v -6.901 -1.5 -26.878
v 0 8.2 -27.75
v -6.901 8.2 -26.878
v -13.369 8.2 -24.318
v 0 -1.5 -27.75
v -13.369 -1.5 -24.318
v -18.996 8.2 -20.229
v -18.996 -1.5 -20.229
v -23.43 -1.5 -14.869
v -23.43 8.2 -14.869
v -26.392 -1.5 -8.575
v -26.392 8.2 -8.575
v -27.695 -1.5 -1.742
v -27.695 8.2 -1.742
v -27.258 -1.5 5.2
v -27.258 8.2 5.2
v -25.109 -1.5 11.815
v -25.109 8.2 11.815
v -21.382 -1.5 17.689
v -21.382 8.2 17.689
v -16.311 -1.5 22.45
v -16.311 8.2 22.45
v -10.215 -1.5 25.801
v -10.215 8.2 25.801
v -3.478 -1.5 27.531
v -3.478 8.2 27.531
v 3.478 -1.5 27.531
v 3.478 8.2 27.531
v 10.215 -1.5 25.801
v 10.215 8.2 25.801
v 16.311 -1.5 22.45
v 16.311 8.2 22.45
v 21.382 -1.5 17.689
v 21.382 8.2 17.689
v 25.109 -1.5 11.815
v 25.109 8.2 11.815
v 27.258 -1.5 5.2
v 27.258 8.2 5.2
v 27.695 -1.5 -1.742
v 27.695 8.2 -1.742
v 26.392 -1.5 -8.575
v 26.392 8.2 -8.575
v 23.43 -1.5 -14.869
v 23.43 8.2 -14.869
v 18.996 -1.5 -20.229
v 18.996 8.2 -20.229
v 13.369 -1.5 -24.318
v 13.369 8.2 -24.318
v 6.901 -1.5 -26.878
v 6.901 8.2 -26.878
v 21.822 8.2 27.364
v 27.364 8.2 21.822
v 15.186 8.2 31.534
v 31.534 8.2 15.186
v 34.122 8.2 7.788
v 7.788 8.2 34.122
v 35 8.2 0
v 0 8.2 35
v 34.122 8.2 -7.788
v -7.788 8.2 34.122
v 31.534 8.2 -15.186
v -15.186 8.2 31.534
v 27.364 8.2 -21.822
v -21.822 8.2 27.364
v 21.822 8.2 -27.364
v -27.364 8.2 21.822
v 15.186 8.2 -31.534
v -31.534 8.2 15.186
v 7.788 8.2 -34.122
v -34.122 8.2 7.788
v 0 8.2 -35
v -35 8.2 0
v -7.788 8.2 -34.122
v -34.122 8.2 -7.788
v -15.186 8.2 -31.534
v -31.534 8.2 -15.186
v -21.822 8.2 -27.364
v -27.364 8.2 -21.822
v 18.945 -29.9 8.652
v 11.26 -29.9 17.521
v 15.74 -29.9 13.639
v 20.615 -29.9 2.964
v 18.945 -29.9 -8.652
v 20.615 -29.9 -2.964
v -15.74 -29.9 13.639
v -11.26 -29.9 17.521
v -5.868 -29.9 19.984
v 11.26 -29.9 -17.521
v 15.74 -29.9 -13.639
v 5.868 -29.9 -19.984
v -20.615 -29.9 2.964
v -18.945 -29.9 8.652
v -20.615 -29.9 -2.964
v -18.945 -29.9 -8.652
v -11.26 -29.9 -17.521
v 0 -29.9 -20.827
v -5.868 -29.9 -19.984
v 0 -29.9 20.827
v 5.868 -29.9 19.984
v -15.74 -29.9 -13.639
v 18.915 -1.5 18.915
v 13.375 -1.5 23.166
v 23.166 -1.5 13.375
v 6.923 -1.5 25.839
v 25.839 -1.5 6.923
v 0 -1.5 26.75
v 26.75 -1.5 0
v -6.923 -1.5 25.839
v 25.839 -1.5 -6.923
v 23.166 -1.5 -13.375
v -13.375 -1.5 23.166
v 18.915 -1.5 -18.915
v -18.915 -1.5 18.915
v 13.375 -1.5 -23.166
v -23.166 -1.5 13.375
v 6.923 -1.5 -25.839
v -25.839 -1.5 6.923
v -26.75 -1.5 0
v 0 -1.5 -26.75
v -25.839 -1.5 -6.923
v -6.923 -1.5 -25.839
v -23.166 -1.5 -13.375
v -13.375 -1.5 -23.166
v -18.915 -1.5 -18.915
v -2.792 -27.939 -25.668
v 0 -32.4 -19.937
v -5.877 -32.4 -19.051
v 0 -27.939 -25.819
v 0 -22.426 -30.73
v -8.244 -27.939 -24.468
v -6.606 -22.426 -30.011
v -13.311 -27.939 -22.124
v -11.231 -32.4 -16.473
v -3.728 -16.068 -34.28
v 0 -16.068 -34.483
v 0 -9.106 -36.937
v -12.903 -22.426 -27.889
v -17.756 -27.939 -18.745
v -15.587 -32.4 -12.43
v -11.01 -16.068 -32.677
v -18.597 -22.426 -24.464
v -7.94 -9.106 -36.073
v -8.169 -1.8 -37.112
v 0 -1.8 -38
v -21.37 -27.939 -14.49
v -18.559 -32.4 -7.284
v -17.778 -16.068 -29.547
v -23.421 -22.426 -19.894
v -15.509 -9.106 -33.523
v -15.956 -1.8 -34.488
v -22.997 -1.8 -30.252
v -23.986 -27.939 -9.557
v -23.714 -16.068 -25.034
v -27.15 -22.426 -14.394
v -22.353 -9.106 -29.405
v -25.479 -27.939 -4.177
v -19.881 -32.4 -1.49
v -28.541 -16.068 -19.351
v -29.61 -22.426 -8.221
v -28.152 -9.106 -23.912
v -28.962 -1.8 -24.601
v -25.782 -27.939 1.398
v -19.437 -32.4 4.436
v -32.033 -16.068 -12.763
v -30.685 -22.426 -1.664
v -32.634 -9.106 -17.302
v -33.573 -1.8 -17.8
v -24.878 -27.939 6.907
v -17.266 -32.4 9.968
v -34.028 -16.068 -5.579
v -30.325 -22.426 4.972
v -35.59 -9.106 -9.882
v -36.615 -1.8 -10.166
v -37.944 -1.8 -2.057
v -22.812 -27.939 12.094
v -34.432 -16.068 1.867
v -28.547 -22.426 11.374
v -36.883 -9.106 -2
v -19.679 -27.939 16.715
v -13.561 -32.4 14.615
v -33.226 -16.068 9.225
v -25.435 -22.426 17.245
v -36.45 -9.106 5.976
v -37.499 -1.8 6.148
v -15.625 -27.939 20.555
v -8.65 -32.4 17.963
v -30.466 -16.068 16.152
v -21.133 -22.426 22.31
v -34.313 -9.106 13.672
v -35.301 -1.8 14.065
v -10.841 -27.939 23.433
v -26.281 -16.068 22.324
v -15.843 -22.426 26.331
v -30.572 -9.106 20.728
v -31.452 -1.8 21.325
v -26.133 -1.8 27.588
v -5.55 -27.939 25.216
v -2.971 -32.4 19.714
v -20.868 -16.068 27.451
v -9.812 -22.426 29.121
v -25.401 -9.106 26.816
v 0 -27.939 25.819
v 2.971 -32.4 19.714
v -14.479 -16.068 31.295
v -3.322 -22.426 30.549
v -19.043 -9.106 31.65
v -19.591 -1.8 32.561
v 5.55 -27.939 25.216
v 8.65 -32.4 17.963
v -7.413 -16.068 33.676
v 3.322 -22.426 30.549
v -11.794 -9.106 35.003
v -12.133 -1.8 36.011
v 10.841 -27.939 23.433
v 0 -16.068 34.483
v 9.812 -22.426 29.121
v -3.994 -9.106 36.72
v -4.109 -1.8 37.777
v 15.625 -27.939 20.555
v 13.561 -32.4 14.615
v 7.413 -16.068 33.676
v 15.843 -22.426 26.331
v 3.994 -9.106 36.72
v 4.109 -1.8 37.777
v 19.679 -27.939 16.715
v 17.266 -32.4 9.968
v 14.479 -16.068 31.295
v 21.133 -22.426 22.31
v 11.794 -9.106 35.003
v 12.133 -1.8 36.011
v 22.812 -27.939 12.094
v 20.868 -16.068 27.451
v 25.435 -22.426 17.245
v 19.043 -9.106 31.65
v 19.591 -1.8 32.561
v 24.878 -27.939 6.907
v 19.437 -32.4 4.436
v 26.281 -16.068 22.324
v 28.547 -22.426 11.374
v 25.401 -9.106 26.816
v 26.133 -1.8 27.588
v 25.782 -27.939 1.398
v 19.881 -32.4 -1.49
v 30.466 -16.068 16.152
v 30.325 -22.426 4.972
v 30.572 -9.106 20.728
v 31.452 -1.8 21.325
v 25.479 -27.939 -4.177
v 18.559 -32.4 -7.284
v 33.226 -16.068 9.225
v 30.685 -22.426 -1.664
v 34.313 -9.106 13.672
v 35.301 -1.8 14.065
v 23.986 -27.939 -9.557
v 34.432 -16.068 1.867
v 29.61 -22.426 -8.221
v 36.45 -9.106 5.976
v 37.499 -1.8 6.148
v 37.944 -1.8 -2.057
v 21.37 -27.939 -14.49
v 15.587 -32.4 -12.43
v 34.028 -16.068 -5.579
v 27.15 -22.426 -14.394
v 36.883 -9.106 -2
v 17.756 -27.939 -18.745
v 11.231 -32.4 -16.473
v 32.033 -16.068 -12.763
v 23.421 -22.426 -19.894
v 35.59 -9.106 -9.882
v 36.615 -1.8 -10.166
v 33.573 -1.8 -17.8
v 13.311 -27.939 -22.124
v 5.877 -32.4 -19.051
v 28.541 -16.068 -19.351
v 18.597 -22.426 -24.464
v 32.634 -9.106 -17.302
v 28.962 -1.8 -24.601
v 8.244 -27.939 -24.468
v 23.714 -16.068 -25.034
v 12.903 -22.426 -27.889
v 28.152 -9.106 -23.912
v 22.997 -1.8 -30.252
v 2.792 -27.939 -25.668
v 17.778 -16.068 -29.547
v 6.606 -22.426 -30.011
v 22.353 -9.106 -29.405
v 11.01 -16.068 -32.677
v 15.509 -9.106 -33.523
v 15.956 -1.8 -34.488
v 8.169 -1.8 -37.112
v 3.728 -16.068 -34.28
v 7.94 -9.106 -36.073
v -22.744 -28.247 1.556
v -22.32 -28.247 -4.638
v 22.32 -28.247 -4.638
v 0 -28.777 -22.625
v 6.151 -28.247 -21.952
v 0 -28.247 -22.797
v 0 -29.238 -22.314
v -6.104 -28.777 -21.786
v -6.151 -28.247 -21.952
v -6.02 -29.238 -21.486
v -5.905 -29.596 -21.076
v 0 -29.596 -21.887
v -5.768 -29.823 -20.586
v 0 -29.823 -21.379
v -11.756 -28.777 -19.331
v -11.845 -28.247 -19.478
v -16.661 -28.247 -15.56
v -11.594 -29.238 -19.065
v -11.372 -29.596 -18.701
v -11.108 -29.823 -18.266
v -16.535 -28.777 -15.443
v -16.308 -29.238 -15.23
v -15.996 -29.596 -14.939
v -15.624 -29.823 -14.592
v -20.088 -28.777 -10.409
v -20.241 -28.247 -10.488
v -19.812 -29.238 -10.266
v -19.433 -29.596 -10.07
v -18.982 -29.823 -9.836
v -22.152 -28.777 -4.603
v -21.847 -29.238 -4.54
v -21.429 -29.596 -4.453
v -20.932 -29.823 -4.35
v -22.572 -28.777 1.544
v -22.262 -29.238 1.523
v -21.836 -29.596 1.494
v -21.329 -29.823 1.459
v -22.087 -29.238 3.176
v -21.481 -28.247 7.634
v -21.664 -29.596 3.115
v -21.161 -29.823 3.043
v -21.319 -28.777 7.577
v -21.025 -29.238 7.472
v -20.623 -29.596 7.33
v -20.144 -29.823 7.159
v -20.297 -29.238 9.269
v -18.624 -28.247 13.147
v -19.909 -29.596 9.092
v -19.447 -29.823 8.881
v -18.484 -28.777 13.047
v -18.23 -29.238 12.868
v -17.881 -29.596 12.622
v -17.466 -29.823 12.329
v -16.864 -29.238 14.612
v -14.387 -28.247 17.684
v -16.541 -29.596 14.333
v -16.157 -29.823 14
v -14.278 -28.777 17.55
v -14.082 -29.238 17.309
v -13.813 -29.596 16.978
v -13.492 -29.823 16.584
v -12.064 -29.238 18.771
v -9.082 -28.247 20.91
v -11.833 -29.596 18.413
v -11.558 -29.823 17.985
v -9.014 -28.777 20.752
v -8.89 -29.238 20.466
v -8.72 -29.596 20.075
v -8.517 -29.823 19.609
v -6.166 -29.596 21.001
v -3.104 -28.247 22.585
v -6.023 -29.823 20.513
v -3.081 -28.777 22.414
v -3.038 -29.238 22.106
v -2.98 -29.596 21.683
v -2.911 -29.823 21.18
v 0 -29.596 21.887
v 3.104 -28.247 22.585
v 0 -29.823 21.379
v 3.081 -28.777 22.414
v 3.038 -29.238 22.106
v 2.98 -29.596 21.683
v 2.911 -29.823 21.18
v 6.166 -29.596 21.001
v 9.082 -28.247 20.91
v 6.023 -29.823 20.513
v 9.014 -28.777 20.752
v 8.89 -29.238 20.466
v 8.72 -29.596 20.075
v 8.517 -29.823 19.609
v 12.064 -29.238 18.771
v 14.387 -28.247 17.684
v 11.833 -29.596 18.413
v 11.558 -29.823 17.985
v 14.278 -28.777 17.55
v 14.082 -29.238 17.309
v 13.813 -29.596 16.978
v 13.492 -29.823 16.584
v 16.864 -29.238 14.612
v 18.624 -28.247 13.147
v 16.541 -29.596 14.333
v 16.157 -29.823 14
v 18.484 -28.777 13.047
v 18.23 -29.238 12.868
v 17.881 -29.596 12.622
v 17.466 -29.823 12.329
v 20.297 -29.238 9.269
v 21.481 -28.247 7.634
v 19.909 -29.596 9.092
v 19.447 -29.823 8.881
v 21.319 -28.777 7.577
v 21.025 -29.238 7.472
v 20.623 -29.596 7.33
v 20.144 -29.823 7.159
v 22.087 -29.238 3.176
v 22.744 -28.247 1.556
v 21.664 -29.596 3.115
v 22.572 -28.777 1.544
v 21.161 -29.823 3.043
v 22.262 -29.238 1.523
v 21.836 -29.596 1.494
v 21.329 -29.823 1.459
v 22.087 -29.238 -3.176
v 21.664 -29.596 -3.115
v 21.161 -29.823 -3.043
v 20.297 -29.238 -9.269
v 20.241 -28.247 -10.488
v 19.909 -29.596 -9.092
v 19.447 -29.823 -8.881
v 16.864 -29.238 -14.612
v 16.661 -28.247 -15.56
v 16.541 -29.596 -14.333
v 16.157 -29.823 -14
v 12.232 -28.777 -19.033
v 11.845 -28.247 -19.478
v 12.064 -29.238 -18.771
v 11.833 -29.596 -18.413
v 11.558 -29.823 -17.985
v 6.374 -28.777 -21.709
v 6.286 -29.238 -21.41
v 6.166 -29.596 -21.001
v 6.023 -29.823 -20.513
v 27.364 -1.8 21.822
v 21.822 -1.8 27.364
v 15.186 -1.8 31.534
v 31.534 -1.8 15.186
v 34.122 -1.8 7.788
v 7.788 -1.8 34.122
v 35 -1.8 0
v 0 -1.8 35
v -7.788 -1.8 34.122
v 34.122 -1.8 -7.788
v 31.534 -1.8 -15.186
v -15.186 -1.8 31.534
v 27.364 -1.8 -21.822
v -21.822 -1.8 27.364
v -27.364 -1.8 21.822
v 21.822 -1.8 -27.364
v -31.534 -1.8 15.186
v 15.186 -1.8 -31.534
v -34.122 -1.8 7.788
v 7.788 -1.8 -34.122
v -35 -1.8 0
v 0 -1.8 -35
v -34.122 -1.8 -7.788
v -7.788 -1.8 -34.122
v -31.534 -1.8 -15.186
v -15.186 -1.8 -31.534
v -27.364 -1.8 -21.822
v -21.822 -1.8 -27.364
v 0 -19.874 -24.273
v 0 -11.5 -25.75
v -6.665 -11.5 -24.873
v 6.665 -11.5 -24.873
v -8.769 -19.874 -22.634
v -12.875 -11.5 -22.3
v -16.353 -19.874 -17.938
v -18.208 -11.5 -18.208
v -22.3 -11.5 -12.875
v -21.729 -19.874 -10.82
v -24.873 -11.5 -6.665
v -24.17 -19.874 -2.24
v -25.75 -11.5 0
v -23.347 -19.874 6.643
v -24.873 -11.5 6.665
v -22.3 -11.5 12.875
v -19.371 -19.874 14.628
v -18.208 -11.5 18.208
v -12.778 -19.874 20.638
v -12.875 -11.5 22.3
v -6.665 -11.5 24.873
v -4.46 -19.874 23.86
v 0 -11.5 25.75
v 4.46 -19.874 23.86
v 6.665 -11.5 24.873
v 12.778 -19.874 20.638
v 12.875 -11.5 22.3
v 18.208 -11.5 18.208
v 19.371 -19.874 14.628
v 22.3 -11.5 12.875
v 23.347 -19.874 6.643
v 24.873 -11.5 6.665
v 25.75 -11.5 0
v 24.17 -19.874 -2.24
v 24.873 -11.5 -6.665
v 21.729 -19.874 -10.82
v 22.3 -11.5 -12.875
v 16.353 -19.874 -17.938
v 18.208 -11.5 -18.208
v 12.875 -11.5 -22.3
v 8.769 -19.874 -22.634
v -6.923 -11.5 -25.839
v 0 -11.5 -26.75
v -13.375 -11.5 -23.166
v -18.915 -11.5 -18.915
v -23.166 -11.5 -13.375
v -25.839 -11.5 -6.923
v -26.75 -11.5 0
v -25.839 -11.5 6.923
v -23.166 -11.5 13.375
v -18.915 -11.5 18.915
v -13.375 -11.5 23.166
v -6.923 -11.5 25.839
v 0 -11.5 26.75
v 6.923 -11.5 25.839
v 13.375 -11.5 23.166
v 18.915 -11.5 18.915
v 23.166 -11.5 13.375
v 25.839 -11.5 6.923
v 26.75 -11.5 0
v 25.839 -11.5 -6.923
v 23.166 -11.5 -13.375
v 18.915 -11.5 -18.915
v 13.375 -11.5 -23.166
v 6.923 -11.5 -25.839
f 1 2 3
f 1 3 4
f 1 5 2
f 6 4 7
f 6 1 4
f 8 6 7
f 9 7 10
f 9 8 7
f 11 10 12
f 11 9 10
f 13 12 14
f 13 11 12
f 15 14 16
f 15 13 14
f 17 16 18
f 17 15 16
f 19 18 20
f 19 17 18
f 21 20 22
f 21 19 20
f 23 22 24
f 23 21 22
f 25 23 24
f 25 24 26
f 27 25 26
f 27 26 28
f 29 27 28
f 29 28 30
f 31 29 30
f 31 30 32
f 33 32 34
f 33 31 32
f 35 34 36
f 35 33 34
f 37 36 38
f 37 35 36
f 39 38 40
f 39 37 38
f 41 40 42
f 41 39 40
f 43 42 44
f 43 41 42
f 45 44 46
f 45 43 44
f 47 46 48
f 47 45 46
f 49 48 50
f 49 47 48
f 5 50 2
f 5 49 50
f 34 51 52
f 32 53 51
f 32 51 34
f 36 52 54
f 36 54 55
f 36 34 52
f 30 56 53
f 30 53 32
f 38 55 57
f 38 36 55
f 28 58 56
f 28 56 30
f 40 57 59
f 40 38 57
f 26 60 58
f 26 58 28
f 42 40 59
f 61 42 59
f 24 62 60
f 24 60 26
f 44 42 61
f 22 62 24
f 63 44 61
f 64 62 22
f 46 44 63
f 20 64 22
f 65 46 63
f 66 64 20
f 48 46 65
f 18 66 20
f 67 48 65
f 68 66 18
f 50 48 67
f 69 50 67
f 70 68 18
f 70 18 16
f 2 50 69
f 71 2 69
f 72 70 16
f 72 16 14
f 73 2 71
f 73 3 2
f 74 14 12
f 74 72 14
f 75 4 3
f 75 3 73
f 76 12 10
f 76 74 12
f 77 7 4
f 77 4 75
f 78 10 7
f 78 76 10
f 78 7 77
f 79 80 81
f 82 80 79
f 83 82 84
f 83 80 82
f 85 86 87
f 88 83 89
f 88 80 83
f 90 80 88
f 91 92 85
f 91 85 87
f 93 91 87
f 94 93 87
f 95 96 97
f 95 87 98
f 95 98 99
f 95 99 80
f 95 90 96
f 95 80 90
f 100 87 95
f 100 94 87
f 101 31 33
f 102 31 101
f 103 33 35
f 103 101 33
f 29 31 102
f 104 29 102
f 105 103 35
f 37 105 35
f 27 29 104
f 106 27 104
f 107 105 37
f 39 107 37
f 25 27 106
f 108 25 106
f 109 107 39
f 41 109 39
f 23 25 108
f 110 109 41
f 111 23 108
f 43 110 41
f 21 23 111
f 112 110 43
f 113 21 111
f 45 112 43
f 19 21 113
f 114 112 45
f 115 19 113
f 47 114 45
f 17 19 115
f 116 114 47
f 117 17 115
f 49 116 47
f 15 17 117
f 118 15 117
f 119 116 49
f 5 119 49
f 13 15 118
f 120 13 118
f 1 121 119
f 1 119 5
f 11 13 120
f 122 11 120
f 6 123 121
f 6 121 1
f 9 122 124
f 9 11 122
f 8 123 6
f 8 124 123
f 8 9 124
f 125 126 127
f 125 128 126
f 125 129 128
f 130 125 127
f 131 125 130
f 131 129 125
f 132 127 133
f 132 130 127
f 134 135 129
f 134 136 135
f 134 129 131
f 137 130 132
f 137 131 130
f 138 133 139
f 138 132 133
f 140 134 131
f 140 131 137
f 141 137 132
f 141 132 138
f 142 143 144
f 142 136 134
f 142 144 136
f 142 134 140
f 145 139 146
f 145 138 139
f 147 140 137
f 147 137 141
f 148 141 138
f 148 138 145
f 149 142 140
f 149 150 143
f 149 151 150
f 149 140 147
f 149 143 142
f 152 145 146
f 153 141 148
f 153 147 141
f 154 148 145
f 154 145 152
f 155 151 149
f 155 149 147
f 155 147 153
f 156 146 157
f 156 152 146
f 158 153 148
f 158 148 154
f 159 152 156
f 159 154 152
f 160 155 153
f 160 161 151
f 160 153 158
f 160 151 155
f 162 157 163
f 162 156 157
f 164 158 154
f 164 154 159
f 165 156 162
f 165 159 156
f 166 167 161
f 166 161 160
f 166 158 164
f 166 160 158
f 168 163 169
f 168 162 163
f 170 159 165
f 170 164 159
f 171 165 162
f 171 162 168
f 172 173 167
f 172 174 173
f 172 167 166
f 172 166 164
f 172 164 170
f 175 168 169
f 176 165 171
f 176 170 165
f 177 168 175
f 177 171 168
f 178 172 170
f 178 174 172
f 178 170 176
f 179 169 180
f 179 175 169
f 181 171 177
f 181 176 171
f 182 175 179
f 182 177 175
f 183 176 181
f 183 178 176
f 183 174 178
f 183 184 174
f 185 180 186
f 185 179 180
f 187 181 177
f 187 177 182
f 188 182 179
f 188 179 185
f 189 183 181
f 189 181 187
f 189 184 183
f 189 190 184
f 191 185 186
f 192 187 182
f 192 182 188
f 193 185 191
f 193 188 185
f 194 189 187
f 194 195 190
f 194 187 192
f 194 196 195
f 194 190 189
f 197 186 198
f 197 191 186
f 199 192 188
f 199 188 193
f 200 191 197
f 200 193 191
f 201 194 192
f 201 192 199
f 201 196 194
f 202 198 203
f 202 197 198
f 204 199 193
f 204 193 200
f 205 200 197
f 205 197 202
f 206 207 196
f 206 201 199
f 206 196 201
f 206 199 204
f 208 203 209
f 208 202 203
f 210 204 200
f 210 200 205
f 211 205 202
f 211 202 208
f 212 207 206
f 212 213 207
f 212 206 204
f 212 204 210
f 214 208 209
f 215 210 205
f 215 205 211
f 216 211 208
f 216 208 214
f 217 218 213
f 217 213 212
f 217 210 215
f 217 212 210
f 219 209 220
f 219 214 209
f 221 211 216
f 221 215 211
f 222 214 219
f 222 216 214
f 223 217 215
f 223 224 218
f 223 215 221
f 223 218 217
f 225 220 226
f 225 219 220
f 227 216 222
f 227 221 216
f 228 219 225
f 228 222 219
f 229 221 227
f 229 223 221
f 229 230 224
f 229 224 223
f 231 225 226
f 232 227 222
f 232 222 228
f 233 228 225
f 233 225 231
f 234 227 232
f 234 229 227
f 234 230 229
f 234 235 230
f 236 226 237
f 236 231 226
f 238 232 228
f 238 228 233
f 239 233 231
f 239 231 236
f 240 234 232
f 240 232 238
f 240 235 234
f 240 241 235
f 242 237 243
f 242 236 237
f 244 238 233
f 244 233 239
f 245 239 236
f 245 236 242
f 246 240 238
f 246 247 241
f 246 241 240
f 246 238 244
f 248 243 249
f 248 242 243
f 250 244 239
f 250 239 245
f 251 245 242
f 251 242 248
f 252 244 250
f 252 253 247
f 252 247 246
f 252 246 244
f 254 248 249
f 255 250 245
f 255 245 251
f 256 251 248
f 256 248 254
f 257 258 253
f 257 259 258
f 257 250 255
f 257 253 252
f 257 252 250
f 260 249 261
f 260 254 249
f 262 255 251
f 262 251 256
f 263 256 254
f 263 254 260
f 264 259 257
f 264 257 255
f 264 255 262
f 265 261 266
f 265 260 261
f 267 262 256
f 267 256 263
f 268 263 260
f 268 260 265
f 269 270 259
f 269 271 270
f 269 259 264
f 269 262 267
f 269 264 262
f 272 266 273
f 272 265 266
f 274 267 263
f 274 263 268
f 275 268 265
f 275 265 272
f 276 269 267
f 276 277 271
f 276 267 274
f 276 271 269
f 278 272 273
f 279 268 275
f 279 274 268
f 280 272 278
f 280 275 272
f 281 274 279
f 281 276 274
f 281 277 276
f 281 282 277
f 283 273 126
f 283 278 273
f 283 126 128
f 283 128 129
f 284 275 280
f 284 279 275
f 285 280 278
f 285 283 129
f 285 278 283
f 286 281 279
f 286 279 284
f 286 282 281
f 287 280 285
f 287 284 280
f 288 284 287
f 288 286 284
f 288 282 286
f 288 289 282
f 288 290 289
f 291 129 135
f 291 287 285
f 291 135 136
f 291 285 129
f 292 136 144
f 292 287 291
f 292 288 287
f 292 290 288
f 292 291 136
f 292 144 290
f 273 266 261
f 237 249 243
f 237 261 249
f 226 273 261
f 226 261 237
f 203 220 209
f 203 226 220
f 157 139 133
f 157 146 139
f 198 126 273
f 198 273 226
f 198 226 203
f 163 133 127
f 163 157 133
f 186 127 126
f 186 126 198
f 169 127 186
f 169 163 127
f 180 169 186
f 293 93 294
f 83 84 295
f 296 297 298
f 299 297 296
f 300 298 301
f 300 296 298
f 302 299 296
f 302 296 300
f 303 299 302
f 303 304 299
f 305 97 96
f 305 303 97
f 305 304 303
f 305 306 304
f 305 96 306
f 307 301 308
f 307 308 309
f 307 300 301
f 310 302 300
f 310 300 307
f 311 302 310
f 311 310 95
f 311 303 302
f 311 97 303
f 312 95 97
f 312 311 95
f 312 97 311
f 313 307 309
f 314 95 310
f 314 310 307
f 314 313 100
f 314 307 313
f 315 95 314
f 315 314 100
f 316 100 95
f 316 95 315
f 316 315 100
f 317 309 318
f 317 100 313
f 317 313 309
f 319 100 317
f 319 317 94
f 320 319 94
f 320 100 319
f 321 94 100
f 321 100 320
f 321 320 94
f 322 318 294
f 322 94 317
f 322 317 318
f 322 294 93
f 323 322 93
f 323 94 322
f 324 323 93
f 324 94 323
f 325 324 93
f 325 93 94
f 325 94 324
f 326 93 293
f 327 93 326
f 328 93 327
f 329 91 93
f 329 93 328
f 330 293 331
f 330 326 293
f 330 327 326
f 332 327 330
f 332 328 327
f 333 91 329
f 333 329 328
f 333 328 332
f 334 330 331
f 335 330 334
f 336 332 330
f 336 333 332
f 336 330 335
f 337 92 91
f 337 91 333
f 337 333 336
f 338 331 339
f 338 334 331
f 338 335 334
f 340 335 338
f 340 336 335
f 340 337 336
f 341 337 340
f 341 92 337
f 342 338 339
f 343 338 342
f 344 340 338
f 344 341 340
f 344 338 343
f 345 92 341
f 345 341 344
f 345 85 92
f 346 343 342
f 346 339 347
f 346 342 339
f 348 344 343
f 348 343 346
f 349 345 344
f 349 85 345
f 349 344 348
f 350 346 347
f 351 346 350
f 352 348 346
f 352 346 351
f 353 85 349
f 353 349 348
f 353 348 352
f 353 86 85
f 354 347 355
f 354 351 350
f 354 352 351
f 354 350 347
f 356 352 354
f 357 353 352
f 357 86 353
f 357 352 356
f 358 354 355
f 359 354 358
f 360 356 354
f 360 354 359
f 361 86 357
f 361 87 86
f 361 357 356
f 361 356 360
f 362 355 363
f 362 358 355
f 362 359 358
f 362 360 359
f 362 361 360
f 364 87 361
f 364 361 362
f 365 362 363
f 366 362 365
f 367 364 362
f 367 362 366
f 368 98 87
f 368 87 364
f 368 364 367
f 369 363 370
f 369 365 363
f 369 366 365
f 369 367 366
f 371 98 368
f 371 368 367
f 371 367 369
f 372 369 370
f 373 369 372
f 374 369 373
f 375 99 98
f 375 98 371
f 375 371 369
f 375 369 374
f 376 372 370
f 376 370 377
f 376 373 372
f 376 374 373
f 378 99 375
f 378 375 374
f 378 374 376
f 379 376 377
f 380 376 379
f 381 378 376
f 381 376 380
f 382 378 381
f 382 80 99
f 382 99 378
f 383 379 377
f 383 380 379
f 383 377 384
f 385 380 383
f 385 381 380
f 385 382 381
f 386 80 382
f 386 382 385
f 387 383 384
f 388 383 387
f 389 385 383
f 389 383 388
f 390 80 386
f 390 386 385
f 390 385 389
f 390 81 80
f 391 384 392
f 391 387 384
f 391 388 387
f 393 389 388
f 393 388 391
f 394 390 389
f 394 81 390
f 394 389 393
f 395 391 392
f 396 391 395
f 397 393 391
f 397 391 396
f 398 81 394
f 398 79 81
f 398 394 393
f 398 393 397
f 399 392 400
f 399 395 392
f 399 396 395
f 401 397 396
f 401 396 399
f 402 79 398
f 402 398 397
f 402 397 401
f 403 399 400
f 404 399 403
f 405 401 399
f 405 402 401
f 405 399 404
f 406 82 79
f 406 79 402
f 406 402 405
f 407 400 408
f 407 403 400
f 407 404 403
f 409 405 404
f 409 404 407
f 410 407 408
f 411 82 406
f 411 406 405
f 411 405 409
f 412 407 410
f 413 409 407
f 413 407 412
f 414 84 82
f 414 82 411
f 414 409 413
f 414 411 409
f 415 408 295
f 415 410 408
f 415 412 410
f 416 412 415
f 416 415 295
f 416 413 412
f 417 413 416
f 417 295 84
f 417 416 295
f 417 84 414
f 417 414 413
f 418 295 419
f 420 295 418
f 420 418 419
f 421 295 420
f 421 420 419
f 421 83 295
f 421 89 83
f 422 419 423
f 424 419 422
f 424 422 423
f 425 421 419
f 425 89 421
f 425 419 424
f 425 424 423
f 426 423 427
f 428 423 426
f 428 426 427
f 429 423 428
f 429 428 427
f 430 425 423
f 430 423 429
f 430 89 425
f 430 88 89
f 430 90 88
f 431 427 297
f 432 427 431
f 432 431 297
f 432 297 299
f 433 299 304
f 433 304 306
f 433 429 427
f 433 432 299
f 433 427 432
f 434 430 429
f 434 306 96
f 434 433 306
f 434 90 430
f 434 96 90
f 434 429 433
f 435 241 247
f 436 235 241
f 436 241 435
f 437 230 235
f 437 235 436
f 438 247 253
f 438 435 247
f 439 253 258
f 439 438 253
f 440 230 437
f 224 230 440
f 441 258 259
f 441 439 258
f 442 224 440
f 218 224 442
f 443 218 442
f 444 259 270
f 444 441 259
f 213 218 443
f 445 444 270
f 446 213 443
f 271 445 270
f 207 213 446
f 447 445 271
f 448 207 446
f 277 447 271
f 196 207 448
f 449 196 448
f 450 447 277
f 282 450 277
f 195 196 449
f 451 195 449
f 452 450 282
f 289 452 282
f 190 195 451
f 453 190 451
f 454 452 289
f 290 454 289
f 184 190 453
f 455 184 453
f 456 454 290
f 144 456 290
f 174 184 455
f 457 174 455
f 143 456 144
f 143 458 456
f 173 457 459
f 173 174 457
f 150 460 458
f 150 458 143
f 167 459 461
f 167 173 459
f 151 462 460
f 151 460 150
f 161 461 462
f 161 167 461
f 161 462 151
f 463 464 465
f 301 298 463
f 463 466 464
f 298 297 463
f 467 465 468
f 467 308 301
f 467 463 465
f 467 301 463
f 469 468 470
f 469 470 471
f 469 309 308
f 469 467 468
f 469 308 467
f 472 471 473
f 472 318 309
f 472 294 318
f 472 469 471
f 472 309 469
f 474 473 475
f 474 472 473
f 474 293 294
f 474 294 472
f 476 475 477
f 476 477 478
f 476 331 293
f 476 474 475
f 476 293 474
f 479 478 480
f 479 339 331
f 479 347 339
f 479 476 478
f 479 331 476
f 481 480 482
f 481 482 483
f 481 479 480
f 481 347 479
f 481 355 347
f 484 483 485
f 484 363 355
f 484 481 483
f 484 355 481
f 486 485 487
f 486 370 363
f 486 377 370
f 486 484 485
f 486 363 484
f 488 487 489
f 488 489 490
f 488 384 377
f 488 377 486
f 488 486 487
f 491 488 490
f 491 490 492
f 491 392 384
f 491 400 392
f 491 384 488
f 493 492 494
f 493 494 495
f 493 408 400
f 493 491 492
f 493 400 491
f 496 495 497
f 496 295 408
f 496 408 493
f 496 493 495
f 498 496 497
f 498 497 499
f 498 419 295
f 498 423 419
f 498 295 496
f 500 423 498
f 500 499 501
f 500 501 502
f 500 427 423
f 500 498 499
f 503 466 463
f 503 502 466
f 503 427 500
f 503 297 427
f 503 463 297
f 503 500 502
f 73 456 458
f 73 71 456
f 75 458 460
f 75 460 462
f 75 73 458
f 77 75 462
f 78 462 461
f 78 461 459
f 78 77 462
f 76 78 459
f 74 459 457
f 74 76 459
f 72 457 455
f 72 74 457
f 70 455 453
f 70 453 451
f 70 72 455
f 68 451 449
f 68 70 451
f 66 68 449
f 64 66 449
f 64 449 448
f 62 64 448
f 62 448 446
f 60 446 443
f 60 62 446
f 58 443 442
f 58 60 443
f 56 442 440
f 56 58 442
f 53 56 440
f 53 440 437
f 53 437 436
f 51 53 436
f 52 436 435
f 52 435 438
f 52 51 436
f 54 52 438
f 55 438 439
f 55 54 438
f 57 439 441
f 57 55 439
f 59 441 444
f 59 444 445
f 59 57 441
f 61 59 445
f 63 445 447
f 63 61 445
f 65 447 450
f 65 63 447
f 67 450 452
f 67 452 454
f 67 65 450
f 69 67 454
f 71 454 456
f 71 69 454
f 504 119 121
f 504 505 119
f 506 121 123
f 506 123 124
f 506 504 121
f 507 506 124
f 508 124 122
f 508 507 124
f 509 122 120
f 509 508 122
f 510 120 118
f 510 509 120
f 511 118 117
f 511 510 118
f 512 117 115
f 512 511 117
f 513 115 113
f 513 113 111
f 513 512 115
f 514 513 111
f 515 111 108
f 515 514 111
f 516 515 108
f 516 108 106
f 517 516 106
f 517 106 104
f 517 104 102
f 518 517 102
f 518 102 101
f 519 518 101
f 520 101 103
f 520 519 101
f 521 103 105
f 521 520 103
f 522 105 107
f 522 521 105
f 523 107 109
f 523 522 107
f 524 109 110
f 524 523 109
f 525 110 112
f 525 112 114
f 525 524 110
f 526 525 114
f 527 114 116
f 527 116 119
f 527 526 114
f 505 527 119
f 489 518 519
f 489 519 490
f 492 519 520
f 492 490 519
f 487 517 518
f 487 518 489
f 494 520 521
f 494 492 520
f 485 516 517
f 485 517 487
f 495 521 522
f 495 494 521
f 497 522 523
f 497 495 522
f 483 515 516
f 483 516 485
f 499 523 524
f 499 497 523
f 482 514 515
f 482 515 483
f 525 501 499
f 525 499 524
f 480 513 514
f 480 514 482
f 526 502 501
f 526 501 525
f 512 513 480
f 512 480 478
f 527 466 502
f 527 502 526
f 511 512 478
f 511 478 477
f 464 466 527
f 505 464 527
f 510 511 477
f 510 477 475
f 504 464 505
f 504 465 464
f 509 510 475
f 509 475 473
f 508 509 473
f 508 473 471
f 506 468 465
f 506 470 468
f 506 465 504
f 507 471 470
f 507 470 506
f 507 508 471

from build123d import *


with BuildPart() as part:
    # Sketch1 → Revolve1 (revolve)
    with BuildSketch(Plane(origin=(0, 0, 0), x_dir=(0, 0, -1), z_dir=(1, 0, 0)), mode=Mode.PRIVATE) as revolve1_sk:
        with BuildLine():
            Line((-27.75, 0), (-27.75, -1.5))
            Line((-27.75, -1.5), (-26.75, -1.5))
            Line((-26.75, -1.5), (-26.75, -11.5))
            Line((-26.75, -11.5), (-25.75, -11.5))
            Line((-25.75, -11.5), (-22.796999799, -28.247296355))
            ThreePointArc((-22.796999799, -28.247296355), (-22.112959512, -29.432088886), (-20.827384293, -29.9))
            Line((-20.827384293, -29.9), (0, -29.9))
            Line((0, -29.9), (0, -32.4))
            Line((0, -32.4), (-19.936900461, -32.4))
            ThreePointArc((-19.936900461, -32.4), (-32.760664046, -19.338533844), (-38, -1.8))
            Line((-38, -1.8), (-35, -1.8))
            Line((-35, -1.8), (-35, 8.2))
            Line((-35, 8.2), (-27.75, 8.2))
            Line((-27.75, 8.2), (-27.75, 0))
        make_face()
    revolve(revolve1_sk.sketch.rotate(Axis((0, 0, 0), (0, 1, 0)), 180), axis=Axis((0, 0, 0), (0, 1, 0)))


solid = part.part
